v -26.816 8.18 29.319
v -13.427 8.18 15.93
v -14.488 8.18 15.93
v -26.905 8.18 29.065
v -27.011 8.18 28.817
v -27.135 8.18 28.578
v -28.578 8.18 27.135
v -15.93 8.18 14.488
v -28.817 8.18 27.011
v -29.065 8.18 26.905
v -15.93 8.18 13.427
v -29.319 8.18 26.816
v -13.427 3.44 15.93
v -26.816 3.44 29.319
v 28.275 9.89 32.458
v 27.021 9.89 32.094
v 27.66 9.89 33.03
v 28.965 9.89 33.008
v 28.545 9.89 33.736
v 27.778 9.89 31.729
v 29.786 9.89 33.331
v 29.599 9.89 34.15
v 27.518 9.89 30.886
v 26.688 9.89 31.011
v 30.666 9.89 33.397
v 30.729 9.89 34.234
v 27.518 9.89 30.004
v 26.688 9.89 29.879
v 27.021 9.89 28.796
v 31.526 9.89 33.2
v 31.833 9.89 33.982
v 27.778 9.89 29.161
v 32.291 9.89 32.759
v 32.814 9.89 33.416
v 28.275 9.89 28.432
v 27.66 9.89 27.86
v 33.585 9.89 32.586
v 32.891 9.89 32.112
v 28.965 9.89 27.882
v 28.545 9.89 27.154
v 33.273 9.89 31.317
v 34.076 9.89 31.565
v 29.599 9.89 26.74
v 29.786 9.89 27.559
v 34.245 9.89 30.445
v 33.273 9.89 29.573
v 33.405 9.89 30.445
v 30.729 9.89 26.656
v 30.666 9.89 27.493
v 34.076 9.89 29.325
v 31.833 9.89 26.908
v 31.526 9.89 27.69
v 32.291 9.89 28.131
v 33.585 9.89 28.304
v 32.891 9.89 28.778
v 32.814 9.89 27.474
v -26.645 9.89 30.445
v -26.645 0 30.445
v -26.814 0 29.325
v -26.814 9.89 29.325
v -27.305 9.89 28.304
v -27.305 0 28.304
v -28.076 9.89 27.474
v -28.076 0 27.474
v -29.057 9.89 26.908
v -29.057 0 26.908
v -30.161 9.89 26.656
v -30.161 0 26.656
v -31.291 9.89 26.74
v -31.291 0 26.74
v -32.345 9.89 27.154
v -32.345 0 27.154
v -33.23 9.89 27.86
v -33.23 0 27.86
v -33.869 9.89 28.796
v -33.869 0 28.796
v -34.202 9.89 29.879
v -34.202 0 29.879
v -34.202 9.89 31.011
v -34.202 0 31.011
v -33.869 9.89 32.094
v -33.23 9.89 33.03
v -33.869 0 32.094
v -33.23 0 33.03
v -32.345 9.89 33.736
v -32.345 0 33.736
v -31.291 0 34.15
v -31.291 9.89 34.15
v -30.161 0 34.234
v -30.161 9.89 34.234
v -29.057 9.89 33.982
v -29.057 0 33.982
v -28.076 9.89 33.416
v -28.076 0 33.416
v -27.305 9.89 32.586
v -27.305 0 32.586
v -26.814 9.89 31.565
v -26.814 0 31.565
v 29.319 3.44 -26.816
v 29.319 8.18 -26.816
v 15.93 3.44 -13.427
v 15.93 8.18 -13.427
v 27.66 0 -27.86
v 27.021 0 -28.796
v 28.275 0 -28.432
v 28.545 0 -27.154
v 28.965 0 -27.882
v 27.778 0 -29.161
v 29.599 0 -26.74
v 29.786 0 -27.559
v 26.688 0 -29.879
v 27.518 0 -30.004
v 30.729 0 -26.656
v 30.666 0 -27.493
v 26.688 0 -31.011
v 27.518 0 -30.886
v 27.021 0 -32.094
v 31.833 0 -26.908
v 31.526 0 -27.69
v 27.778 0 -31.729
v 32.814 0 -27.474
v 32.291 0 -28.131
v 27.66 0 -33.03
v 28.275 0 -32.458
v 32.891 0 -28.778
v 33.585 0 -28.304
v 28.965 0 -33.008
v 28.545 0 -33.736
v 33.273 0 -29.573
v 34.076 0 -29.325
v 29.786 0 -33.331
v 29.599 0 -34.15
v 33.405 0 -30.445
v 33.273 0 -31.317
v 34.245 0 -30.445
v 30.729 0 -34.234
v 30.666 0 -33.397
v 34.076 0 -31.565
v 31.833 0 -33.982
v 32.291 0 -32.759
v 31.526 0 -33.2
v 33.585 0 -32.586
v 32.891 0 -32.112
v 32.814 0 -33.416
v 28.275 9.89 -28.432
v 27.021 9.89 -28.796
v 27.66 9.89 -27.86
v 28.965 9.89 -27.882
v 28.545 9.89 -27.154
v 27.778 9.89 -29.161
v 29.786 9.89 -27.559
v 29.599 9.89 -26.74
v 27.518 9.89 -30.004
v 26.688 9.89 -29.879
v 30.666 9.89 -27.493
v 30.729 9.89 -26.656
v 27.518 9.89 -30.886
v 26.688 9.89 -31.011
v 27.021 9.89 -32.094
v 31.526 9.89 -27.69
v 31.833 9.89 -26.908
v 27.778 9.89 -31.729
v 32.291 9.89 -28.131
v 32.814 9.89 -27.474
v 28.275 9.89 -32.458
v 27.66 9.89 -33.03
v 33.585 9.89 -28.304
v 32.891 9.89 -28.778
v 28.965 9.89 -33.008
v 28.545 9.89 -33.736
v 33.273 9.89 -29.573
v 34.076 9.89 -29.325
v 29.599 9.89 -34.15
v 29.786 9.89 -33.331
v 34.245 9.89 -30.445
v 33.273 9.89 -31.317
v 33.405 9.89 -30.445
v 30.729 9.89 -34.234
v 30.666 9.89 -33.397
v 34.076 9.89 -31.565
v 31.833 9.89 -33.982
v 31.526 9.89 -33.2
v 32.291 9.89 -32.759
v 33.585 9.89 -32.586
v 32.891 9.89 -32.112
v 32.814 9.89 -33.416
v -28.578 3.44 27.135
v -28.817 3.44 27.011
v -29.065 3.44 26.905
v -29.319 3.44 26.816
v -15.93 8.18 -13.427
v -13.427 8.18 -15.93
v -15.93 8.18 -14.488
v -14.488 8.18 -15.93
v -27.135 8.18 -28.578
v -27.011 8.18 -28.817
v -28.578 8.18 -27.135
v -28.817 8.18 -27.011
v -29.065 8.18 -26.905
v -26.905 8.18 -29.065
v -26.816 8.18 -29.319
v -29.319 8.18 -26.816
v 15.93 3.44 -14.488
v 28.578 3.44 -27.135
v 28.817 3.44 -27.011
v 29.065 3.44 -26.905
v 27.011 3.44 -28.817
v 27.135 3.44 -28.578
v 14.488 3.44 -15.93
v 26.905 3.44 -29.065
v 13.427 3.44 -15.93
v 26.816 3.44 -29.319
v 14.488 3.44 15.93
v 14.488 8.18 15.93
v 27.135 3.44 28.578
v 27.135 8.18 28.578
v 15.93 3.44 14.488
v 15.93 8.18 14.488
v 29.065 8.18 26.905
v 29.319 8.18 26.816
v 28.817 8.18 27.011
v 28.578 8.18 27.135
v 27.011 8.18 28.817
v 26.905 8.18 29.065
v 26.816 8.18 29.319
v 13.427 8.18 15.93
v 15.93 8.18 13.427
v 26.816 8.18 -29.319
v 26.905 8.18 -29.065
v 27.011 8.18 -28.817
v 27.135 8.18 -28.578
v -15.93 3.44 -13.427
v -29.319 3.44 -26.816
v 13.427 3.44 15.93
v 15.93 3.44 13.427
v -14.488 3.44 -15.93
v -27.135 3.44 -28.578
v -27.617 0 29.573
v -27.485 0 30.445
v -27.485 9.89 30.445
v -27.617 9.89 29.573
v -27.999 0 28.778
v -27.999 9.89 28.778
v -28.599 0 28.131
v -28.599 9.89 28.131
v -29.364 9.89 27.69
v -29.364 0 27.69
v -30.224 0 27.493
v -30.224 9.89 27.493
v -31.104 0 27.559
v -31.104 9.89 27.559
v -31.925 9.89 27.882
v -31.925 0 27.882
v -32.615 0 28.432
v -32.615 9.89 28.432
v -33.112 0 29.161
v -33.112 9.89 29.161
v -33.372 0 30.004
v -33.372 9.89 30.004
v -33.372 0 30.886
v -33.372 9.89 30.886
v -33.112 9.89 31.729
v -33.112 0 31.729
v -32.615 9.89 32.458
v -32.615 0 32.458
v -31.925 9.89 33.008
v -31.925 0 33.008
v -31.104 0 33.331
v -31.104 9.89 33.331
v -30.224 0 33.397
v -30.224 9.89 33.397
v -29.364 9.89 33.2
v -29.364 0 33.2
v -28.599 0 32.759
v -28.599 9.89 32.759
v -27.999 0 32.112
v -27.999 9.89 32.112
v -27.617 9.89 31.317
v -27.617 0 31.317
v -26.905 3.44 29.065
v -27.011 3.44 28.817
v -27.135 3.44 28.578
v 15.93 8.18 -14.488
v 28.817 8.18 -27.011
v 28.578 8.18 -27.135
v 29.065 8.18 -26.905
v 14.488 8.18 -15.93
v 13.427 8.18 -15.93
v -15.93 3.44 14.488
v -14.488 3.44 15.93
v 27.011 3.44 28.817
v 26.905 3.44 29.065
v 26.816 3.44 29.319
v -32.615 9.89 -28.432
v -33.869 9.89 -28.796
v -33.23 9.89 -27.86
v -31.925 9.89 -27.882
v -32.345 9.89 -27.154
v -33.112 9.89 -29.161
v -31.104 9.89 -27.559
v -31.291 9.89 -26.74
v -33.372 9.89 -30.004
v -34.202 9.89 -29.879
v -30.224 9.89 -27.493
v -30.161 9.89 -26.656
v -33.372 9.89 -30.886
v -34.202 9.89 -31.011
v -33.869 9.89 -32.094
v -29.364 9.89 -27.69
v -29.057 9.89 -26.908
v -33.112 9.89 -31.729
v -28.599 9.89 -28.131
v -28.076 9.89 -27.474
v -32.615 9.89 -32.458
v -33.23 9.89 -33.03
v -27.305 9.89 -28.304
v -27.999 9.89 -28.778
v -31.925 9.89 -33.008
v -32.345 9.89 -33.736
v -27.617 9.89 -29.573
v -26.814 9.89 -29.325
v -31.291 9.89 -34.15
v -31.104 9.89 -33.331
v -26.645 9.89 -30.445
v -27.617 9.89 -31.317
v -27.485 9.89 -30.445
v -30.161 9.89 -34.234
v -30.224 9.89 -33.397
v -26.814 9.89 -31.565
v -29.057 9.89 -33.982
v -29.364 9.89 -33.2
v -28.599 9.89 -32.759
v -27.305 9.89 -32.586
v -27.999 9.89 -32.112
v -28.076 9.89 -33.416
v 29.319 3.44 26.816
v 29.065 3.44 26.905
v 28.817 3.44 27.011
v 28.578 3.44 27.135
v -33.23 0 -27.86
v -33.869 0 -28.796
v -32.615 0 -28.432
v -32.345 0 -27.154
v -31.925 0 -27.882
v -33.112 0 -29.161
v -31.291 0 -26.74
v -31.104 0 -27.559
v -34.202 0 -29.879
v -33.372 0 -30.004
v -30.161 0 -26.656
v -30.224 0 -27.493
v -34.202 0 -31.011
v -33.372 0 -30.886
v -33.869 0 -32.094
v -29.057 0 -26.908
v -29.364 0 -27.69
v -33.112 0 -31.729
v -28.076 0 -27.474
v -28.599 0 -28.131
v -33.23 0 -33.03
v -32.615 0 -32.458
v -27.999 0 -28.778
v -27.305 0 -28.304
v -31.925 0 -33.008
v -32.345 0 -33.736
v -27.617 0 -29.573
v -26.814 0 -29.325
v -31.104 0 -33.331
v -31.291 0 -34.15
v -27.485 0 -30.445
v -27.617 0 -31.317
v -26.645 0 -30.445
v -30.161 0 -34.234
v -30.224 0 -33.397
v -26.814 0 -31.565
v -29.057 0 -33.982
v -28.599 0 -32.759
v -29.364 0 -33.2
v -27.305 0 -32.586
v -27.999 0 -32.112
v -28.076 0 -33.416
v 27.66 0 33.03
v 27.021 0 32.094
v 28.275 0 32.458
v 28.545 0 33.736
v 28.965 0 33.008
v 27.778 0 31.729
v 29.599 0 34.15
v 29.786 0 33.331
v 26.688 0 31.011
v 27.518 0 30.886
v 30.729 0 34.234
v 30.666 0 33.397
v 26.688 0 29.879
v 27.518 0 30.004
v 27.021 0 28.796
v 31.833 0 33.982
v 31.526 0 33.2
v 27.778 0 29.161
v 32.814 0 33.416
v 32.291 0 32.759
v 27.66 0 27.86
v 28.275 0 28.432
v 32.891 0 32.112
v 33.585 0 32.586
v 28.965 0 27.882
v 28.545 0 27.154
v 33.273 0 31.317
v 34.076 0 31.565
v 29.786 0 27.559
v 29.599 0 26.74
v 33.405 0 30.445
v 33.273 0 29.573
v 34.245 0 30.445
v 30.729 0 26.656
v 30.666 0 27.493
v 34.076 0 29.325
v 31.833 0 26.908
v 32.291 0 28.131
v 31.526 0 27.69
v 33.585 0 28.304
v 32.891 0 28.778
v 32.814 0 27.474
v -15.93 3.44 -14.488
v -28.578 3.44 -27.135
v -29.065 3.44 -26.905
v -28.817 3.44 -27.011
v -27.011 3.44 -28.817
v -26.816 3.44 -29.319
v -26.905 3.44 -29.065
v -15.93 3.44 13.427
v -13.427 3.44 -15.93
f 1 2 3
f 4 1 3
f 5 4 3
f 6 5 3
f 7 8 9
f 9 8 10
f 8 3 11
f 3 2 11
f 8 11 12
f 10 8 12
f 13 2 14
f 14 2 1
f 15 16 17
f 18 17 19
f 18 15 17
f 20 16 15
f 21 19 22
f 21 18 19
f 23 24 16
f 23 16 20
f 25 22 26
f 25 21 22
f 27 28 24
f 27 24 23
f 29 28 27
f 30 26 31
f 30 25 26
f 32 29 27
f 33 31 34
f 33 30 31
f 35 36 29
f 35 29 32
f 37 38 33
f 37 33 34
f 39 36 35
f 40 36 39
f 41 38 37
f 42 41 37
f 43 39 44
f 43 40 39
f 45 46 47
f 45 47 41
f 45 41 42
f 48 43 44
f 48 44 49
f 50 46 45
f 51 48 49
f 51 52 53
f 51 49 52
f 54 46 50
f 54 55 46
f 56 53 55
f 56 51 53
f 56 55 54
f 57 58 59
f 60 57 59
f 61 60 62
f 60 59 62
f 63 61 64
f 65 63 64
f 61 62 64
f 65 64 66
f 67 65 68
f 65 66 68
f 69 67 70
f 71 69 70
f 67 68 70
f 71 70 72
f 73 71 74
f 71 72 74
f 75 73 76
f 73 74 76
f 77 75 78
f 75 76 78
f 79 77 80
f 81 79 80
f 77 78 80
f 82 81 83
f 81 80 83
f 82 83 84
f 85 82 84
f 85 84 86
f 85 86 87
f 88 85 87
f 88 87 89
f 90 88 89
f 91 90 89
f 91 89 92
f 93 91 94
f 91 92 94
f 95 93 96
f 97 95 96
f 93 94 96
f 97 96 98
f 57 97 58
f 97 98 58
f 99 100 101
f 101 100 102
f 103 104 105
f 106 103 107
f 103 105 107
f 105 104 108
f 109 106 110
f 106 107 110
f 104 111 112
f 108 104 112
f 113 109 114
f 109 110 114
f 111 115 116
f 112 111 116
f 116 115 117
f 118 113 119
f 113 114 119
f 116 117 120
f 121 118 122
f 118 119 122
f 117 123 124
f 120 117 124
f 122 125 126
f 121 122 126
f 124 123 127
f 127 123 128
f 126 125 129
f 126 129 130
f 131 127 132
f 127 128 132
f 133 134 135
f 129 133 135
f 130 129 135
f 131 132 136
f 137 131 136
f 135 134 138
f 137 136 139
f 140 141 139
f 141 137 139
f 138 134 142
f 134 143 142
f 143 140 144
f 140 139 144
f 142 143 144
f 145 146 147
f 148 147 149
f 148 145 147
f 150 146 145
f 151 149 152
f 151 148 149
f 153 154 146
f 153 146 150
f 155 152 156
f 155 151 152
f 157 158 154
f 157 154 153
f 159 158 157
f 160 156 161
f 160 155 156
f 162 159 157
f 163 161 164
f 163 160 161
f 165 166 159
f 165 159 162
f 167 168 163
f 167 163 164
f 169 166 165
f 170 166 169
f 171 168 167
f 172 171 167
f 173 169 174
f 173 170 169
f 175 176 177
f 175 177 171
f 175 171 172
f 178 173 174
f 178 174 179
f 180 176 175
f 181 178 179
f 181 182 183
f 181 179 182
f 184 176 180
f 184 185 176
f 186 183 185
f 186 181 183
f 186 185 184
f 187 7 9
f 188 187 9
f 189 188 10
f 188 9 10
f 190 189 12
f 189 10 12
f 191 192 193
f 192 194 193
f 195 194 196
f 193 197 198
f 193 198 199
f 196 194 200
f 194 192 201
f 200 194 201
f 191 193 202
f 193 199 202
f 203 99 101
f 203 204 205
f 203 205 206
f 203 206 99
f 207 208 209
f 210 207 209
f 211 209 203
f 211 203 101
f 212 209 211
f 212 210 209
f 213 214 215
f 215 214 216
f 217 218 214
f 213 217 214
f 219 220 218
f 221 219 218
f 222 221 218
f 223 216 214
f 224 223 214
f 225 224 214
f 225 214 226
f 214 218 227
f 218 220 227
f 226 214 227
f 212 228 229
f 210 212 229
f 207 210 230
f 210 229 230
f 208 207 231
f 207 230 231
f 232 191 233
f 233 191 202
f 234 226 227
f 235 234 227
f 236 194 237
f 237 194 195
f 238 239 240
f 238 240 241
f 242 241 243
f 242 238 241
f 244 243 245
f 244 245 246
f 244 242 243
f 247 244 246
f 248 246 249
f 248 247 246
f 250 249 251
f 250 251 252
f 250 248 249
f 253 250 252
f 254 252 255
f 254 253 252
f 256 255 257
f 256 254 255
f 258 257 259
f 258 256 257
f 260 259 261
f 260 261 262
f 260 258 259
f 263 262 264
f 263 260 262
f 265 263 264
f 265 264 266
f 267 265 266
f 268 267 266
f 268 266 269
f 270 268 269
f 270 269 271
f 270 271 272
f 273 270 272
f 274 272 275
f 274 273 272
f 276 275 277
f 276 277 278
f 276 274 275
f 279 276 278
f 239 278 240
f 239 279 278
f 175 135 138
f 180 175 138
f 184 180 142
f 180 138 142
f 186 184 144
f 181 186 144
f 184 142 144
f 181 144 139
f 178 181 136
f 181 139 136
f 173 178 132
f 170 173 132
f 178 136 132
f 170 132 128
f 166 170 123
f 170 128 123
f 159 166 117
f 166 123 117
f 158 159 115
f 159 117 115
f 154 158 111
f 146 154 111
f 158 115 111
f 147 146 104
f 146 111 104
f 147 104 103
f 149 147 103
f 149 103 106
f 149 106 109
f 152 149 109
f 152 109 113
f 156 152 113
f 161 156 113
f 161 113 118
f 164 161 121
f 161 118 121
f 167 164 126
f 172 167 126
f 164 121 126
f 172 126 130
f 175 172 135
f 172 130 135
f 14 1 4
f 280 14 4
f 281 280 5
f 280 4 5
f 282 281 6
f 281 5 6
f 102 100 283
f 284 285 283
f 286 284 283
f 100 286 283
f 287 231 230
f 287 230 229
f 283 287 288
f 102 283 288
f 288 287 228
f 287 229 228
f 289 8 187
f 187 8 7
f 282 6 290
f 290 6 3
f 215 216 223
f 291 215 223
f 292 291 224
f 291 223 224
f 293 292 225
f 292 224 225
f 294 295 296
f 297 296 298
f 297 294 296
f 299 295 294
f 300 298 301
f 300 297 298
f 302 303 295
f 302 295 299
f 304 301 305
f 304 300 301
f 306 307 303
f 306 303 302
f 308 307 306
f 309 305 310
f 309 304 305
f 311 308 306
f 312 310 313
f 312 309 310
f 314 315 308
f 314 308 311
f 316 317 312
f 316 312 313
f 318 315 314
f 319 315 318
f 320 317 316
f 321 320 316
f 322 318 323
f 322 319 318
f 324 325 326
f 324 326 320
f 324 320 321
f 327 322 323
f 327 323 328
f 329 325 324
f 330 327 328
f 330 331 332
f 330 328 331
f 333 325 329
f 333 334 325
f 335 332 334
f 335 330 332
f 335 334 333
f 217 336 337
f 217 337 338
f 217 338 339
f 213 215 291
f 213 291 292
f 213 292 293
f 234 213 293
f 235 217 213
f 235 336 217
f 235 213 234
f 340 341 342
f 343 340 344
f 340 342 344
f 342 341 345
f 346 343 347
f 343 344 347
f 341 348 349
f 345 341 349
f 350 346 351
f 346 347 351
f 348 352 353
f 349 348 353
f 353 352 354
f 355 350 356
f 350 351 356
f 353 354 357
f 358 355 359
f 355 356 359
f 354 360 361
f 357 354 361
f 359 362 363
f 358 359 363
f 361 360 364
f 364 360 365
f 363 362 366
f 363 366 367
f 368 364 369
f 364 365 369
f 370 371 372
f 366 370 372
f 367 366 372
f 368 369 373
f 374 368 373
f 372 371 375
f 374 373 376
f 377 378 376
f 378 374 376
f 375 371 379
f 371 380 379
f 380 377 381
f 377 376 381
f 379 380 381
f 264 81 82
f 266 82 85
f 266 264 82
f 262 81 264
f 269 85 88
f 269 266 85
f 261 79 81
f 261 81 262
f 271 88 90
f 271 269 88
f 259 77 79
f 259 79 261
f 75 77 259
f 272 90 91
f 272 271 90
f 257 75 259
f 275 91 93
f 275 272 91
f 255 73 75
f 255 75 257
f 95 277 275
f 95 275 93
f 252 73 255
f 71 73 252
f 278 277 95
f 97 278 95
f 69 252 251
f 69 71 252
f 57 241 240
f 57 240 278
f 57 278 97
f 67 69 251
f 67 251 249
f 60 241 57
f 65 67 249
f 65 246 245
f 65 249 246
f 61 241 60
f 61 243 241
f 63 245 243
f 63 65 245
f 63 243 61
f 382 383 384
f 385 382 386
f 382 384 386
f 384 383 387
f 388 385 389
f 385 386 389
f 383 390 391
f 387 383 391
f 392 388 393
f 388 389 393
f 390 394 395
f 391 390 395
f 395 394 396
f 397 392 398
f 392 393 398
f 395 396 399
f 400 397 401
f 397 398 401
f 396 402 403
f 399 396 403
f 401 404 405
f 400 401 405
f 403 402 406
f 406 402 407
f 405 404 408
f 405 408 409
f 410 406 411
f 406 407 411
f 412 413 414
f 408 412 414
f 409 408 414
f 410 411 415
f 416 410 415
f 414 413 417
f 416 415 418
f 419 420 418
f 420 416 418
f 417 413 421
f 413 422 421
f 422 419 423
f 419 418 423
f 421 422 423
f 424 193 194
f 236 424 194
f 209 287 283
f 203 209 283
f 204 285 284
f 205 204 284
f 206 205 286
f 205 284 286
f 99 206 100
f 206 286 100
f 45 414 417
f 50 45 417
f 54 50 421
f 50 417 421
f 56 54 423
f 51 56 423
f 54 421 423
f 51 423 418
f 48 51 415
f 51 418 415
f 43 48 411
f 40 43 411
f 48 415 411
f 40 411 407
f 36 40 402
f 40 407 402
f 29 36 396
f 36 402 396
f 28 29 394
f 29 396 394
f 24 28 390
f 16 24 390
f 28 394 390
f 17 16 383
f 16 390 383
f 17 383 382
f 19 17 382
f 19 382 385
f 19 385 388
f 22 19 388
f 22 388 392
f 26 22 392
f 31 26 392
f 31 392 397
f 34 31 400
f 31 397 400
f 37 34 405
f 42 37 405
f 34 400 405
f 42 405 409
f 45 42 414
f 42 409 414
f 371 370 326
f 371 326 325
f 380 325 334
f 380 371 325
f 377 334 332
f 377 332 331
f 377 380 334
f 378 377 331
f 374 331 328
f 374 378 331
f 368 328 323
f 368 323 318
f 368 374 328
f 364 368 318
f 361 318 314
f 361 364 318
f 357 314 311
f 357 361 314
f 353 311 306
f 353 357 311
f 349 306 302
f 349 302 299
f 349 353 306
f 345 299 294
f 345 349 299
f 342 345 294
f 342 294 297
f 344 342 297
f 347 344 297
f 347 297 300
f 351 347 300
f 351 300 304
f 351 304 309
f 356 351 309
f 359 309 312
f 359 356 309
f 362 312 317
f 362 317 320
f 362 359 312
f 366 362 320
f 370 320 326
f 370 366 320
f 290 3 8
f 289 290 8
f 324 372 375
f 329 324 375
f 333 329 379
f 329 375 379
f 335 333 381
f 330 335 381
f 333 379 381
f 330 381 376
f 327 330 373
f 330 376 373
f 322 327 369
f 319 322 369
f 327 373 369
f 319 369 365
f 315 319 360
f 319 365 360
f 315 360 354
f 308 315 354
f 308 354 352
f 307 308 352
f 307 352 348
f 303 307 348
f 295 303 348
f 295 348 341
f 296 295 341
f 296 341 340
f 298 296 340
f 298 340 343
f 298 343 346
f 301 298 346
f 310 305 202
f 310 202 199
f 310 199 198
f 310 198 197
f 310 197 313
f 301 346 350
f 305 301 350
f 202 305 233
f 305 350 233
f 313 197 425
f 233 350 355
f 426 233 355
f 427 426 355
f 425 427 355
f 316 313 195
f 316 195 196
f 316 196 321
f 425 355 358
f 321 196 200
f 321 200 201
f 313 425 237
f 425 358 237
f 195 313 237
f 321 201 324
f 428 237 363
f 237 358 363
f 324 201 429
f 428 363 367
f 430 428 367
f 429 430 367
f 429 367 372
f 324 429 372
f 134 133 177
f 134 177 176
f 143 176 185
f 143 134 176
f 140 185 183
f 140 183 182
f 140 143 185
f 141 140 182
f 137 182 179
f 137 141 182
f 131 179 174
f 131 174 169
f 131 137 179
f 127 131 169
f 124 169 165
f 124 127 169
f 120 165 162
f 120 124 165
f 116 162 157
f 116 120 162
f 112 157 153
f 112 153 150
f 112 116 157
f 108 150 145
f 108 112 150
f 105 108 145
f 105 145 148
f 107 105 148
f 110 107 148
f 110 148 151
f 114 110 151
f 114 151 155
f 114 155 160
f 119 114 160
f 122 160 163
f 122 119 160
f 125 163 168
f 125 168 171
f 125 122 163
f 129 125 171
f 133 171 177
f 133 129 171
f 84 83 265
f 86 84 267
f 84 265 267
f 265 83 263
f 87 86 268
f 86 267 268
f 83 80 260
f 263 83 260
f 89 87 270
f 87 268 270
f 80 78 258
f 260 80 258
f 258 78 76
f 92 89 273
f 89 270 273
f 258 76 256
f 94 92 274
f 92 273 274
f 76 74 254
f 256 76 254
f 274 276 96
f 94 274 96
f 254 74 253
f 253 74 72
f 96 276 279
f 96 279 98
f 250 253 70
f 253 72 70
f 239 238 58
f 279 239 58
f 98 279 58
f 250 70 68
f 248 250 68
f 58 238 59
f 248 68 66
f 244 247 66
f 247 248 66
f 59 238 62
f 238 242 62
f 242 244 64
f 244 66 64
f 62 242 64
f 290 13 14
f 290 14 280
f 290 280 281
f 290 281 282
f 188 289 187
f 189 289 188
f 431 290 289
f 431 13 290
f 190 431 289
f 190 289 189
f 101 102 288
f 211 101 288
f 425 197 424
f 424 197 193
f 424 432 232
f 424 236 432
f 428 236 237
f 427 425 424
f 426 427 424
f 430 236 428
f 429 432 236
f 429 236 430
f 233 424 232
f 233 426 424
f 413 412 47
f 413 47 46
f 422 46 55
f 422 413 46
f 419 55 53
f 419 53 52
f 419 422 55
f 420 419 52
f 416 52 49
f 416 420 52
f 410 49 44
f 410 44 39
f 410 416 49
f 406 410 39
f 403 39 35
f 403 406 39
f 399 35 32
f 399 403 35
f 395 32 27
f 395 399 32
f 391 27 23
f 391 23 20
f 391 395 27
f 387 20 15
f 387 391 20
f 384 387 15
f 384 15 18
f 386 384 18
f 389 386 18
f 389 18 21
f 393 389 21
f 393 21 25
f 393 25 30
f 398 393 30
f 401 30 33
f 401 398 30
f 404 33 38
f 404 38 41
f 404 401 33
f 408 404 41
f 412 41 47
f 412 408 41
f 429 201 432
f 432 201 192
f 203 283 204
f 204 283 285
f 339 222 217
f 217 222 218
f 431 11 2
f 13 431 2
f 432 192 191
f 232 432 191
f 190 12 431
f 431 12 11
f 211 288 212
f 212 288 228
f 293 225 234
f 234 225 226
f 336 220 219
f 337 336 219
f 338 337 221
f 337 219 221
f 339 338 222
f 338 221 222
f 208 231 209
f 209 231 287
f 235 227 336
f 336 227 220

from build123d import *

# Parameters (mm, degrees)
SKETCH1_R             = 3.799855969
SKETCH1_R_2           = 2.96
BOSS_EXTRUDE1_DEPTH   = 9.89
BOSS_EXTRUDE1_2_DEPTH = 9.89
BOSS_EXTRUDE1_3_DEPTH = 9.89
BOSS_EXTRUDE1_4_DEPTH = 9.89
BOSS_EXTRUDE2_DEPTH   = 4.74


with BuildPart() as part:
    # Sketch1 → Boss-Extrude1 (new body)
    with BuildSketch(Plane(origin=(0, 0, 0), x_dir=(1, 0, 0), z_dir=(0, 1, 0))):
        with Locations((-30.445, -30.445)):
            Circle(SKETCH1_R)
        with Locations((-30.445, -30.445)):
            Circle(SKETCH1_R_2, mode=Mode.SUBTRACT)
    extrude(amount=BOSS_EXTRUDE1_DEPTH)


with BuildPart() as body_2:
    # Sketch1 → Boss-Extrude1 2 (new body)
    with BuildSketch(Plane(origin=(0, 0, 0), x_dir=(1, 0, 0), z_dir=(0, 1, 0))):
        with Locations((-30.445, 30.445)):
            Circle(SKETCH1_R)
        with Locations((-30.445, 30.445)):
            Circle(SKETCH1_R_2, mode=Mode.SUBTRACT)
    extrude(amount=BOSS_EXTRUDE1_2_DEPTH)

    # Sketch2 → Boss-Extrude2 (add)
    with BuildSketch(Plane(origin=(0, 8.180000118, 0), x_dir=(1, 0, 0), z_dir=(0, 1, 0))):
        with BuildLine():
            Line((-26.815816595, 29.318974601), (-13.426848066, 15.930006071))
            Line((-13.426848066, 15.930006071), (-15.930006071, 13.426848066))
            Line((-15.930006071, 13.426848066), (-29.318974601, 26.815816595))
            ThreePointArc((-29.318974601, 26.815816595), (-28.939956198, 26.95591007), (-28.577957455, 27.135459621))
            Line((-28.577957455, 27.135459621), (-15.930006071, 14.487508237))
            Line((-15.930006071, 14.487508237), (-14.487508237, 15.930006071))
            Line((-14.487508237, 15.930006071), (-27.135459621, 28.577957455))
            ThreePointArc((-27.135459621, 28.577957455), (-26.95591007, 28.939956198), (-26.815816595, 29.318974601))
        make_face()
        with BuildLine():
            Line((29.318974601, 26.815816595), (15.930006071, 13.426848066))
            Line((15.930006071, 13.426848066), (13.426848066, 15.930006071))
            Line((13.426848066, 15.930006071), (26.815816595, 29.318974601))
            ThreePointArc((26.815816595, 29.318974601), (26.95591007, 28.939956198), (27.135459621, 28.577957455))
            Line((27.135459621, 28.577957455), (14.487508237, 15.930006071))
            Line((14.487508237, 15.930006071), (15.930006071, 14.487508237))
            Line((15.930006071, 14.487508237), (28.577957455, 27.135459621))
            ThreePointArc((28.577957455, 27.135459621), (28.939956198, 26.95591007), (29.318974601, 26.815816595))
        make_face()
        with BuildLine():
            Line((26.815816595, -29.318974601), (13.426848066, -15.930006071))
            Line((13.426848066, -15.930006071), (15.930006071, -13.426848066))
            Line((15.930006071, -13.426848066), (29.318974601, -26.815816595))
            ThreePointArc((29.318974601, -26.815816595), (28.939956198, -26.95591007), (28.577957455, -27.135459621))
            Line((28.577957455, -27.135459621), (15.930006071, -14.487508237))
            Line((15.930006071, -14.487508237), (14.487508237, -15.930006071))
            Line((14.487508237, -15.930006071), (27.135459621, -28.577957455))
            ThreePointArc((27.135459621, -28.577957455), (26.95591007, -28.939956198), (26.815816595, -29.318974601))
        make_face()
        with BuildLine():
            Line((-29.318974601, -26.815816595), (-15.930006071, -13.426848066))
            Line((-15.930006071, -13.426848066), (-13.426848066, -15.930006071))
            Line((-13.426848066, -15.930006071), (-26.815816595, -29.318974601))
            ThreePointArc((-26.815816595, -29.318974601), (-26.95591007, -28.939956198), (-27.135459621, -28.577957455))
            Line((-27.135459621, -28.577957455), (-14.487508237, -15.930006071))
            Line((-14.487508237, -15.930006071), (-15.930006071, -14.487508237))
            Line((-15.930006071, -14.487508237), (-28.577957455, -27.135459621))
            ThreePointArc((-28.577957455, -27.135459621), (-28.939956198, -26.95591007), (-29.318974601, -26.815816595))
        make_face()
    extrude(amount=-BOSS_EXTRUDE2_DEPTH)


with BuildPart() as body_3:
    # Sketch1 → Boss-Extrude1 3 (new body)
    with BuildSketch(Plane(origin=(0, 0, 0), x_dir=(1, 0, 0), z_dir=(0, 1, 0))):
        with Locations((30.445, 30.445)):
            Circle(SKETCH1_R)
        with Locations((30.445, 30.445)):
            Circle(SKETCH1_R_2, mode=Mode.SUBTRACT)
    extrude(amount=BOSS_EXTRUDE1_3_DEPTH)


with BuildPart() as body_4:
    # Sketch1 → Boss-Extrude1 4 (new body)
    with BuildSketch(Plane(origin=(0, 0, 0), x_dir=(1, 0, 0), z_dir=(0, 1, 0))):
        with Locations((30.445, -30.445)):
            Circle(SKETCH1_R)
        with Locations((30.445, -30.445)):
            Circle(SKETCH1_R_2, mode=Mode.SUBTRACT)
    extrude(amount=BOSS_EXTRUDE1_4_DEPTH)


solid = Compound([part.part, body_2.part, body_3.part, body_4.part])
